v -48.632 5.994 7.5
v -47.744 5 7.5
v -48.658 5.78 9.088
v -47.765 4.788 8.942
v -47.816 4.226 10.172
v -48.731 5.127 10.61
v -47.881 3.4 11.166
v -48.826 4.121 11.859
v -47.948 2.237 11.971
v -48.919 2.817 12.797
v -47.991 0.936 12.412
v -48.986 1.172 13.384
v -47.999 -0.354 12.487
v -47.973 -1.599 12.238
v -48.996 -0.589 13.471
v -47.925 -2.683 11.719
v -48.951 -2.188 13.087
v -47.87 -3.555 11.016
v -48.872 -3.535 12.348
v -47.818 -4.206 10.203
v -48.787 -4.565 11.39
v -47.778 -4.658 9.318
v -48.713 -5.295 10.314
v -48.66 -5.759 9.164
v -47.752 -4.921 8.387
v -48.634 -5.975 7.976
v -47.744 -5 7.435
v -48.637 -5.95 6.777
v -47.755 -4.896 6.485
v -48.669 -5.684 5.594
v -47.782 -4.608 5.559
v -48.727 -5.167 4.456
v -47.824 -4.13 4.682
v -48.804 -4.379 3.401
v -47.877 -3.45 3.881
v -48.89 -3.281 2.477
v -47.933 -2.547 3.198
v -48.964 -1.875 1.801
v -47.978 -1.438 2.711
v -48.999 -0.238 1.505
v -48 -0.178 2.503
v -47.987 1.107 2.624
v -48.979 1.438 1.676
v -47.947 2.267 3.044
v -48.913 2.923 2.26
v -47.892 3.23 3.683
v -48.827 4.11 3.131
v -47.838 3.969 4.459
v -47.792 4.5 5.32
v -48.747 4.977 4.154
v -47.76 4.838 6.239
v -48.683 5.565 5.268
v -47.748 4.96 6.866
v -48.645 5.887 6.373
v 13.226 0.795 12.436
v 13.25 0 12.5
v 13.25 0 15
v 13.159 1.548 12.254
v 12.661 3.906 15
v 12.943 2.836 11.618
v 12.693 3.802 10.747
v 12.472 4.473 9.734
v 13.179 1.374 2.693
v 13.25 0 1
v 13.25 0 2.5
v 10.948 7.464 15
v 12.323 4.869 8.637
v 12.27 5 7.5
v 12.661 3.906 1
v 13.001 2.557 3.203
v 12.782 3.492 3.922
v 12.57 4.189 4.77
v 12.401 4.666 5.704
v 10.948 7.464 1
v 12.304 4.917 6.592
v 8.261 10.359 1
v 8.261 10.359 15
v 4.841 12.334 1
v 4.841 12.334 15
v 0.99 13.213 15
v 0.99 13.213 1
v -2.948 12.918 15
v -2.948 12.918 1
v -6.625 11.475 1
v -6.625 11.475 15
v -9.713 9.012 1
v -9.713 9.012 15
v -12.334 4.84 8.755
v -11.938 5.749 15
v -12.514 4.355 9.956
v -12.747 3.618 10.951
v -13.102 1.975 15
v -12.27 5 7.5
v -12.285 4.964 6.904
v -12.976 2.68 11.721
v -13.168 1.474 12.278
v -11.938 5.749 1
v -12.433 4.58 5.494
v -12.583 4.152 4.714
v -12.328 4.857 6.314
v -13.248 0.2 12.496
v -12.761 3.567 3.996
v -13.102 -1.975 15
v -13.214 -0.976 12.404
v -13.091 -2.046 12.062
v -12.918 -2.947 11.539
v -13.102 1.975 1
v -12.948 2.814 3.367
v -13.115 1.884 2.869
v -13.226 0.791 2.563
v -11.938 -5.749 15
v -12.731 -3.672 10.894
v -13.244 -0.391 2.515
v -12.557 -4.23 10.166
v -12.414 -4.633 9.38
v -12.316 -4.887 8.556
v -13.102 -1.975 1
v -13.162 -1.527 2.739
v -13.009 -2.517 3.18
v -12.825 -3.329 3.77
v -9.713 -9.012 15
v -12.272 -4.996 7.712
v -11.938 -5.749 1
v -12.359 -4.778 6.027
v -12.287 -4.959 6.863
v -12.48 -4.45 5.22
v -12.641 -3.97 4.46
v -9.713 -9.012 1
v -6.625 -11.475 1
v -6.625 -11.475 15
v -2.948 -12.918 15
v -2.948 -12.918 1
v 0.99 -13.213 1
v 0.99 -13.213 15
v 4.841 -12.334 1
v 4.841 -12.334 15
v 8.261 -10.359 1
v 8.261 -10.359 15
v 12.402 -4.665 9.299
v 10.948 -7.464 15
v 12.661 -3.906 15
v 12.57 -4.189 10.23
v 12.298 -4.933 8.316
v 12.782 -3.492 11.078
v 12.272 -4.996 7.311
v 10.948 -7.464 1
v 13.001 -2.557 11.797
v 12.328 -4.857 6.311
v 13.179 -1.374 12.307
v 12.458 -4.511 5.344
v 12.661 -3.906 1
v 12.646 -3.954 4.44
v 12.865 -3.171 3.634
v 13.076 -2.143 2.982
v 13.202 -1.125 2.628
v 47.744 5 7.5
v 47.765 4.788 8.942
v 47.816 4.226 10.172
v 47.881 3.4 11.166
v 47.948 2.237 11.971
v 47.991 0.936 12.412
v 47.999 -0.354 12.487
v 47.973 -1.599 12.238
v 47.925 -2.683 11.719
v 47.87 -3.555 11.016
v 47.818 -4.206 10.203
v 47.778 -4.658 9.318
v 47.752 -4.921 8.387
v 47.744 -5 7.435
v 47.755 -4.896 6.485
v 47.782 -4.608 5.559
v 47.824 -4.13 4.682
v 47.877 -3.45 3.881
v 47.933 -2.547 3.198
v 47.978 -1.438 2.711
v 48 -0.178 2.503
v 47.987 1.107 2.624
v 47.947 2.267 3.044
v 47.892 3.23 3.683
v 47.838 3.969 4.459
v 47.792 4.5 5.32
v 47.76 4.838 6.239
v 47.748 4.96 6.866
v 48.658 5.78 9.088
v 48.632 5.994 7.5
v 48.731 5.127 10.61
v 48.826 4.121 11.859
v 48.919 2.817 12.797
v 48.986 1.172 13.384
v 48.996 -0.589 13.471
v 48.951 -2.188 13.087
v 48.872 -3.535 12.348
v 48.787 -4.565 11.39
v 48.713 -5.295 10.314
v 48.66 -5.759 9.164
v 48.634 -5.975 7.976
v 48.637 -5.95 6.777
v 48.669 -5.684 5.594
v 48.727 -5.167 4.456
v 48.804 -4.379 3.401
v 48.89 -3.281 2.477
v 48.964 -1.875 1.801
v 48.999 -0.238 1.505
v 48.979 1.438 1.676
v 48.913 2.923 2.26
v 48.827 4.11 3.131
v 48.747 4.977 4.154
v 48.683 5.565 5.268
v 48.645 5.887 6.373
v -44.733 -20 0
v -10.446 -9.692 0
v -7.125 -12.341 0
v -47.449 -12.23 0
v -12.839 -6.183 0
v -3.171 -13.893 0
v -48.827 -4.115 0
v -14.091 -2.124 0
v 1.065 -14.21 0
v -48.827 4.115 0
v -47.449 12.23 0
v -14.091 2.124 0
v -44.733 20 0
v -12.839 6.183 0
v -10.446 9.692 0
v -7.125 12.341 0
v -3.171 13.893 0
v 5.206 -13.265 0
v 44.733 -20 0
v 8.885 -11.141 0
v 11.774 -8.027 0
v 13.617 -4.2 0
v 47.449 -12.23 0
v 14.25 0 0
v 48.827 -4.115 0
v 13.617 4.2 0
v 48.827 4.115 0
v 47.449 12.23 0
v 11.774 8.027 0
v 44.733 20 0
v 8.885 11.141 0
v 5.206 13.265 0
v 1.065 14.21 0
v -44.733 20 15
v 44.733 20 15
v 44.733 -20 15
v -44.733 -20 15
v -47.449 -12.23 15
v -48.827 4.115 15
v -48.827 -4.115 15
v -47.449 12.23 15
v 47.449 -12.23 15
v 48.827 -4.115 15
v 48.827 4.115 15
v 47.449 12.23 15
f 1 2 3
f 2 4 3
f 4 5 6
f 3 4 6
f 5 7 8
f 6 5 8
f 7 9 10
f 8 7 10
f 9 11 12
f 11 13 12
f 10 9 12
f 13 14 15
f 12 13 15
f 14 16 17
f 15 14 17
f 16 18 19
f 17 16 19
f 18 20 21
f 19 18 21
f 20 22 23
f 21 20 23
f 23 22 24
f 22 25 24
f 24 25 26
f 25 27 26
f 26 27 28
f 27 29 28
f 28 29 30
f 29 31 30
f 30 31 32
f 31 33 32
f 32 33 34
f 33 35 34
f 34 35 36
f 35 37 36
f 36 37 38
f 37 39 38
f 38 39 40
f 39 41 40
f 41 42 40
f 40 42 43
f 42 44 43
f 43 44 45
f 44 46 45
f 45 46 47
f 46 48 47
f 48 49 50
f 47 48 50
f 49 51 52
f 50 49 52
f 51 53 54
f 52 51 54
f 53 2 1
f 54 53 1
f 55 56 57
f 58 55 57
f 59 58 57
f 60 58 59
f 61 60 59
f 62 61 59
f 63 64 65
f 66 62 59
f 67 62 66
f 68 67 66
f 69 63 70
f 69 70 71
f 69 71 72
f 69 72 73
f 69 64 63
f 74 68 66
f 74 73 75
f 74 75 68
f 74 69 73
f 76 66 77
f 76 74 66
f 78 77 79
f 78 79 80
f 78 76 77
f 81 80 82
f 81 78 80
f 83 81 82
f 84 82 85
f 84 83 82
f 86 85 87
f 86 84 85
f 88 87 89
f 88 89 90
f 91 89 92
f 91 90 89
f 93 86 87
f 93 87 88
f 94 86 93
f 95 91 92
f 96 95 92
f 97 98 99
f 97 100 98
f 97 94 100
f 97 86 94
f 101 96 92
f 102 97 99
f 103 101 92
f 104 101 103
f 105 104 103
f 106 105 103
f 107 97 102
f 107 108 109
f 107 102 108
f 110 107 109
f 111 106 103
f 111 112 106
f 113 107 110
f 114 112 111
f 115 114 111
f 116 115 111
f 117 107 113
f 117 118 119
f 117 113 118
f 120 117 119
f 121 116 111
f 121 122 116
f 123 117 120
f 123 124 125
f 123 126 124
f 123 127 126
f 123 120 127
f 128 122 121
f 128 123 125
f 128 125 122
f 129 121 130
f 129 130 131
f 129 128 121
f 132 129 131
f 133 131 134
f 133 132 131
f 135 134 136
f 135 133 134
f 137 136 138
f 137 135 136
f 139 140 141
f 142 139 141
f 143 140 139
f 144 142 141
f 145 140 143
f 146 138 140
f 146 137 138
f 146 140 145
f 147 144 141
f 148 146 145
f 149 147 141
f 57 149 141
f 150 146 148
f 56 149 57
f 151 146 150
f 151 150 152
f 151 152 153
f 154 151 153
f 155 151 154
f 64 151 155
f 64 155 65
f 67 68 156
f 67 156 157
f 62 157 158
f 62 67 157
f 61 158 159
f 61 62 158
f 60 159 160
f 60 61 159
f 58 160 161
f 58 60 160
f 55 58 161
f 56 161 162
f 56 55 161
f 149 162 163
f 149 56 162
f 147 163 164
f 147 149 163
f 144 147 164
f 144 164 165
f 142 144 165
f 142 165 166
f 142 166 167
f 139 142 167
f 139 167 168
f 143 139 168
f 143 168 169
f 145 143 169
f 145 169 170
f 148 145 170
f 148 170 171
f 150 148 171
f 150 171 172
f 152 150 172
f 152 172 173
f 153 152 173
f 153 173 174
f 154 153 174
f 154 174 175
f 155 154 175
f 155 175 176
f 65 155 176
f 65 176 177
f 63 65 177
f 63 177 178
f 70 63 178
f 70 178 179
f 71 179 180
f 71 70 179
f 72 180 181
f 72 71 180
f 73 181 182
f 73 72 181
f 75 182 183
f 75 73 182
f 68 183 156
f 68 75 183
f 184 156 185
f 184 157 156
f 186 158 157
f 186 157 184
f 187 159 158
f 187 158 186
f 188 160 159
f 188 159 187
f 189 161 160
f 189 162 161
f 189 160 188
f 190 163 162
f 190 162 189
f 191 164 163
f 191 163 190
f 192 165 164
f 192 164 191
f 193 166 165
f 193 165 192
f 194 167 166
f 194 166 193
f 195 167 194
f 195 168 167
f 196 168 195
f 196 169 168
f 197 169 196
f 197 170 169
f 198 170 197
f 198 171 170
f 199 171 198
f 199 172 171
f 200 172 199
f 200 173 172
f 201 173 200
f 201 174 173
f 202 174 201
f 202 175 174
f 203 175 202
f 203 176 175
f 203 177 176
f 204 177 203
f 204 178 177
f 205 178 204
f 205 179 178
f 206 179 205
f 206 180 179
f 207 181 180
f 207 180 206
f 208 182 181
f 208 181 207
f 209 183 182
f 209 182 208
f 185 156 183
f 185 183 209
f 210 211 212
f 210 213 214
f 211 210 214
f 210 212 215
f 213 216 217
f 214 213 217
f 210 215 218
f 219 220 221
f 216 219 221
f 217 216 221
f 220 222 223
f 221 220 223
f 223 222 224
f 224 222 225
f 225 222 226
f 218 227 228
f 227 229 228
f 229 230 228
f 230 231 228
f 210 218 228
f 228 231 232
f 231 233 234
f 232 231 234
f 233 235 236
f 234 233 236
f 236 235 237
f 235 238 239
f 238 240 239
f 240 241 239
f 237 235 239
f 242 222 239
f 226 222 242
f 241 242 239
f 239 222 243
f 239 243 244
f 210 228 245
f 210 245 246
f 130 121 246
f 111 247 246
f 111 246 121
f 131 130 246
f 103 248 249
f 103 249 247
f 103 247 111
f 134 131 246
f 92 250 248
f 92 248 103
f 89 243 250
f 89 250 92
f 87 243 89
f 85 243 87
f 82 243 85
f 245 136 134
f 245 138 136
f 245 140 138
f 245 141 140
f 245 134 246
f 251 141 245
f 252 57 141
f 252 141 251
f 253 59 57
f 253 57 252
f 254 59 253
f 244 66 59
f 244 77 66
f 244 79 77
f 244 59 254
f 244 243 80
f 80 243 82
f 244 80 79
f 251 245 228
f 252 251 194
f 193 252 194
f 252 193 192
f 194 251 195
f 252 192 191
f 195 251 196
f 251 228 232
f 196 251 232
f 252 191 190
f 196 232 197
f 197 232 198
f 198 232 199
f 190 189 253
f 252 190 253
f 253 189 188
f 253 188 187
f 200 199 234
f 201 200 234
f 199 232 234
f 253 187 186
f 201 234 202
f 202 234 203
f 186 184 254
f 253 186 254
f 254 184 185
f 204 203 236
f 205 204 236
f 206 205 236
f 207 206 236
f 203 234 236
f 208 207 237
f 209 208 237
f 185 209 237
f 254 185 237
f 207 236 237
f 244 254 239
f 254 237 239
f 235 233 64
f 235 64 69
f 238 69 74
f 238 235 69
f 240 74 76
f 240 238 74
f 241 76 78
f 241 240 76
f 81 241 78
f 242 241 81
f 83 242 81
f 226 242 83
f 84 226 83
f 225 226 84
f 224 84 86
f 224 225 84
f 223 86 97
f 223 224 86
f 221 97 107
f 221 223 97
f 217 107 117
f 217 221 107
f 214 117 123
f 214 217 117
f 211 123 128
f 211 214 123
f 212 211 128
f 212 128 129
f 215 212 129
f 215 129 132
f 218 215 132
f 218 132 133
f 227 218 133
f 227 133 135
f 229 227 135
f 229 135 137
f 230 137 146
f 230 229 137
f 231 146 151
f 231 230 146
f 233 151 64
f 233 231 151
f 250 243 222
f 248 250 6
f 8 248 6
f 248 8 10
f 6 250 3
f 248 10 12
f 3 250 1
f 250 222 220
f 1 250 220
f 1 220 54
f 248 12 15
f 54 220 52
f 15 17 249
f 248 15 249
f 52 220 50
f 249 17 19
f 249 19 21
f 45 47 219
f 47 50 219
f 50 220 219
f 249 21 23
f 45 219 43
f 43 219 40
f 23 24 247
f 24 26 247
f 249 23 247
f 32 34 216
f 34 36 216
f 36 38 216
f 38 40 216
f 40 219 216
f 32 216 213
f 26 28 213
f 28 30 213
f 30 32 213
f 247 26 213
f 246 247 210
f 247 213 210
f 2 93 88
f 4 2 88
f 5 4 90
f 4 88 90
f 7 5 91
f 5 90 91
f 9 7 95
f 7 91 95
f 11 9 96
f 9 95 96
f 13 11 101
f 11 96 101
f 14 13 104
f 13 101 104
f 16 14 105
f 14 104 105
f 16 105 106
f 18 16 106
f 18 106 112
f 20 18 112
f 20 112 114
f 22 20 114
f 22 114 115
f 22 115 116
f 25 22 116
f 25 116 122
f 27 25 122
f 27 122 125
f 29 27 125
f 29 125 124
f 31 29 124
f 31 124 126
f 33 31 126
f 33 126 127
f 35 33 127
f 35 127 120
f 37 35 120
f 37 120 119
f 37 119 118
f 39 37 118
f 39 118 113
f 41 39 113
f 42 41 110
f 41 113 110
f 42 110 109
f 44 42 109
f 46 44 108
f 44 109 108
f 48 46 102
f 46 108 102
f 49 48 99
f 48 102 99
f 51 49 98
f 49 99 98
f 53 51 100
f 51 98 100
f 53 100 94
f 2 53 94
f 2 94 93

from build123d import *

# Parameters (mm, degrees)
SKETCH_R          = 13.25
PAD_DEPTH         = 15
SKETCH001_R       = 5
POCKET_DEPTH      = 35.001
POCKET_DEPTH_BACK = -63.001
CHAMFER_SIZE      = 1
CHAMFER001_SIZE   = 1
CHAMFER002_SIZE   = 1


with BuildPart() as part:
    # Sketch → Pad (new body)
    with BuildSketch(Plane.XY):
        with BuildLine():
            ThreePointArc((-44.732538, 20), (-49, 0), (-44.732538, -20))
            Line((44.732538, -20), (-44.732538, -20))
            ThreePointArc((44.732538, -20), (49, 0), (44.732538, 20))
            Line((-44.732538, 20), (44.732538, 20))
        make_face()
        Circle(SKETCH_R, mode=Mode.SUBTRACT)
    extrude(amount=PAD_DEPTH)

    # Sketch001 → Pocket (cut, two sides)
    with BuildSketch(Plane.YZ.offset(-14)) as pocket_sk:
        with Locations((0, 7.5)):
            Circle(SKETCH001_R)
    extrude(amount=-POCKET_DEPTH, mode=Mode.SUBTRACT)
    extrude(pocket_sk.sketch, amount=-POCKET_DEPTH_BACK, mode=Mode.SUBTRACT)

    # Chamfer
    chamfer_edges = [part.edges().sort_by_distance(p)[0] for p in [
        (-13.25, 0, 0),
    ]]
    chamfer(chamfer_edges, length=CHAMFER_SIZE)

    # Chamfer001
    chamfer001_edges = [part.edges().sort_by_distance(p)[0] for p in [
        (-48.74423, -5, 7.5),
    ]]
    chamfer(chamfer001_edges, length=CHAMFER001_SIZE)

    # Chamfer002
    chamfer002_edges = [part.edges().sort_by_distance(p)[0] for p in [
        (48.74423, -5, 7.5),
    ]]
    chamfer(chamfer002_edges, length=CHAMFER002_SIZE)


solid = part.part
